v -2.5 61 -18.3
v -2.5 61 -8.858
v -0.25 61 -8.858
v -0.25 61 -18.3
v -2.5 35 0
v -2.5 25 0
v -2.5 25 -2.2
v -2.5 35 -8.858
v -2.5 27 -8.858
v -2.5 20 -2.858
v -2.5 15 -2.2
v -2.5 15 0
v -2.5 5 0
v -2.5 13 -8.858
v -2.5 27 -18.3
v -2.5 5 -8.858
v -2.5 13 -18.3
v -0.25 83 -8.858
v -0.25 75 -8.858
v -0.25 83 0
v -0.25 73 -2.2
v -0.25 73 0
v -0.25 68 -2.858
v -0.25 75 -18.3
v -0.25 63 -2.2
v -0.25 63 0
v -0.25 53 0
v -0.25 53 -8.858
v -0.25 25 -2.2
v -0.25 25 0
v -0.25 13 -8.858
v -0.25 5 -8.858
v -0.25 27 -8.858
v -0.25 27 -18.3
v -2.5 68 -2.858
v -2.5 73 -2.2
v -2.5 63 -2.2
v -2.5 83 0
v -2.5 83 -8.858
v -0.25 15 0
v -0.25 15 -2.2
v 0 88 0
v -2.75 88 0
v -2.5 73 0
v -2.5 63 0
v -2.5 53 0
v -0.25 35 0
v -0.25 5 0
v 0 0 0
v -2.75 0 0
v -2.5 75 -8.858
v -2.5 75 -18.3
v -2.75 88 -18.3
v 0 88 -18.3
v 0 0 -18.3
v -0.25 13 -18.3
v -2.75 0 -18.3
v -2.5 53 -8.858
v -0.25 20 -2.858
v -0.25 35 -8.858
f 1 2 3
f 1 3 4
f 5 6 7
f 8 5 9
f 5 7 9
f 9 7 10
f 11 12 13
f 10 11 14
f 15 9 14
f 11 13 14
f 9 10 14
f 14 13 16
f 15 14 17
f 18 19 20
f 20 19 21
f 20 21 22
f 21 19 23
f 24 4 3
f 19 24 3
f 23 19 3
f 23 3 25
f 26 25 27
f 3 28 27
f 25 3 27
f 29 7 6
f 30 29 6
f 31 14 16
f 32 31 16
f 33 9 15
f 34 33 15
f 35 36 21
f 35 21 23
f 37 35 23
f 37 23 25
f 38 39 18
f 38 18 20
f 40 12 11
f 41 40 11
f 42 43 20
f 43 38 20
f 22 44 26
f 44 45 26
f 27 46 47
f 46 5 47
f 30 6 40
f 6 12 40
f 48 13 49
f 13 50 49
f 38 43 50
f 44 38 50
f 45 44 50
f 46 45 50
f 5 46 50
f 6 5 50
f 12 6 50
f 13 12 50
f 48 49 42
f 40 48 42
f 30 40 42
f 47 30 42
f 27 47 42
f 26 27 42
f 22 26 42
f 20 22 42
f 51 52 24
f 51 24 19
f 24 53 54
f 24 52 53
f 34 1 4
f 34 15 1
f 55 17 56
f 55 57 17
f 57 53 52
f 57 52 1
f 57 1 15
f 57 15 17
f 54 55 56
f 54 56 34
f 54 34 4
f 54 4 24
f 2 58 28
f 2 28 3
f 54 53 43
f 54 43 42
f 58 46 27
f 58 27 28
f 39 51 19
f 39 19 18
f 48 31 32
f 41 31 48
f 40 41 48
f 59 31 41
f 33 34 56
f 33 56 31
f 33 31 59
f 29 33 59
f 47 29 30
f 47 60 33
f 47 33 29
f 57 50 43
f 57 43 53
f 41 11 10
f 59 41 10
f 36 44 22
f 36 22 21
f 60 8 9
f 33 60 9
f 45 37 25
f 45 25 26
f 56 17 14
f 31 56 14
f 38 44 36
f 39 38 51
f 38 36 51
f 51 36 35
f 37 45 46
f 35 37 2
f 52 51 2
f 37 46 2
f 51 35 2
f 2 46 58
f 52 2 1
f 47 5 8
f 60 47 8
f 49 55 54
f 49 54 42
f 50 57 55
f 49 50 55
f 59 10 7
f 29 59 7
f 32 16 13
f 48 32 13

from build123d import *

# Parameters (mm, degrees)
PROFILE_SKETCH_W          = 2.5
PROFILE_SKETCH_H          = 18.3
PROFILE_EXTRUDE_DEPTH     = 88
COVER_LATCH_CUT_OUT_DEPTH = 2.25
SIDE_SKETCH_W             = 0.25
SIDE_SKETCH_H             = 18.3
SIDE_EXTRUDE_DEPTH        = 88


with BuildPart() as part:
    # Profile Sketch → Profile Extrude (new body)
    with BuildSketch(Plane(origin=(0.045617437, 0, -0.024209872), x_dir=(-1, 0, 0), z_dir=(0, 1, 0))):
        with Locations((1.295617437, -9.125790128)):
            Rectangle(PROFILE_SKETCH_W, PROFILE_SKETCH_H)
    extrude(amount=PROFILE_EXTRUDE_DEPTH)

    # Cover Latch Cut Out Sketch → Cover Latch Cut Out (cut)
    with BuildSketch(Plane.ZY.offset(2.5)):
        Polygon((-18.3, 27), (-18.3, 13), (-8.858262488, 13), (-8.858262488, 5), (0, 5), (0, 15), (-2.2, 15), (-2.858262488, 20), (-2.2, 25), (0, 25), (0, 35), (-8.858262488, 35), (-8.858262488, 27), align=None)
    cover_latch_cut_out = extrude(amount=-COVER_LATCH_CUT_OUT_DEPTH, mode=Mode.SUBTRACT)

    # Cover Latch Cut Out Mirror: Cover Latch Cut Out across plane
    add(cover_latch_cut_out.mirror(Plane(origin=(0, 44, 0), x_dir=(0, 0, 1), z_dir=(0, -1, 0))), mode=Mode.SUBTRACT)

    # Side Sketch → Side Extrude (add, through all)
    with BuildSketch(Plane(origin=(0, 0, 0), x_dir=(1, 0, 0), z_dir=(0, 1, 0))):
        with Locations((-2.625, 9.15)):
            Rectangle(SIDE_SKETCH_W, SIDE_SKETCH_H)
    extrude(amount=SIDE_EXTRUDE_DEPTH)


solid = part.part
